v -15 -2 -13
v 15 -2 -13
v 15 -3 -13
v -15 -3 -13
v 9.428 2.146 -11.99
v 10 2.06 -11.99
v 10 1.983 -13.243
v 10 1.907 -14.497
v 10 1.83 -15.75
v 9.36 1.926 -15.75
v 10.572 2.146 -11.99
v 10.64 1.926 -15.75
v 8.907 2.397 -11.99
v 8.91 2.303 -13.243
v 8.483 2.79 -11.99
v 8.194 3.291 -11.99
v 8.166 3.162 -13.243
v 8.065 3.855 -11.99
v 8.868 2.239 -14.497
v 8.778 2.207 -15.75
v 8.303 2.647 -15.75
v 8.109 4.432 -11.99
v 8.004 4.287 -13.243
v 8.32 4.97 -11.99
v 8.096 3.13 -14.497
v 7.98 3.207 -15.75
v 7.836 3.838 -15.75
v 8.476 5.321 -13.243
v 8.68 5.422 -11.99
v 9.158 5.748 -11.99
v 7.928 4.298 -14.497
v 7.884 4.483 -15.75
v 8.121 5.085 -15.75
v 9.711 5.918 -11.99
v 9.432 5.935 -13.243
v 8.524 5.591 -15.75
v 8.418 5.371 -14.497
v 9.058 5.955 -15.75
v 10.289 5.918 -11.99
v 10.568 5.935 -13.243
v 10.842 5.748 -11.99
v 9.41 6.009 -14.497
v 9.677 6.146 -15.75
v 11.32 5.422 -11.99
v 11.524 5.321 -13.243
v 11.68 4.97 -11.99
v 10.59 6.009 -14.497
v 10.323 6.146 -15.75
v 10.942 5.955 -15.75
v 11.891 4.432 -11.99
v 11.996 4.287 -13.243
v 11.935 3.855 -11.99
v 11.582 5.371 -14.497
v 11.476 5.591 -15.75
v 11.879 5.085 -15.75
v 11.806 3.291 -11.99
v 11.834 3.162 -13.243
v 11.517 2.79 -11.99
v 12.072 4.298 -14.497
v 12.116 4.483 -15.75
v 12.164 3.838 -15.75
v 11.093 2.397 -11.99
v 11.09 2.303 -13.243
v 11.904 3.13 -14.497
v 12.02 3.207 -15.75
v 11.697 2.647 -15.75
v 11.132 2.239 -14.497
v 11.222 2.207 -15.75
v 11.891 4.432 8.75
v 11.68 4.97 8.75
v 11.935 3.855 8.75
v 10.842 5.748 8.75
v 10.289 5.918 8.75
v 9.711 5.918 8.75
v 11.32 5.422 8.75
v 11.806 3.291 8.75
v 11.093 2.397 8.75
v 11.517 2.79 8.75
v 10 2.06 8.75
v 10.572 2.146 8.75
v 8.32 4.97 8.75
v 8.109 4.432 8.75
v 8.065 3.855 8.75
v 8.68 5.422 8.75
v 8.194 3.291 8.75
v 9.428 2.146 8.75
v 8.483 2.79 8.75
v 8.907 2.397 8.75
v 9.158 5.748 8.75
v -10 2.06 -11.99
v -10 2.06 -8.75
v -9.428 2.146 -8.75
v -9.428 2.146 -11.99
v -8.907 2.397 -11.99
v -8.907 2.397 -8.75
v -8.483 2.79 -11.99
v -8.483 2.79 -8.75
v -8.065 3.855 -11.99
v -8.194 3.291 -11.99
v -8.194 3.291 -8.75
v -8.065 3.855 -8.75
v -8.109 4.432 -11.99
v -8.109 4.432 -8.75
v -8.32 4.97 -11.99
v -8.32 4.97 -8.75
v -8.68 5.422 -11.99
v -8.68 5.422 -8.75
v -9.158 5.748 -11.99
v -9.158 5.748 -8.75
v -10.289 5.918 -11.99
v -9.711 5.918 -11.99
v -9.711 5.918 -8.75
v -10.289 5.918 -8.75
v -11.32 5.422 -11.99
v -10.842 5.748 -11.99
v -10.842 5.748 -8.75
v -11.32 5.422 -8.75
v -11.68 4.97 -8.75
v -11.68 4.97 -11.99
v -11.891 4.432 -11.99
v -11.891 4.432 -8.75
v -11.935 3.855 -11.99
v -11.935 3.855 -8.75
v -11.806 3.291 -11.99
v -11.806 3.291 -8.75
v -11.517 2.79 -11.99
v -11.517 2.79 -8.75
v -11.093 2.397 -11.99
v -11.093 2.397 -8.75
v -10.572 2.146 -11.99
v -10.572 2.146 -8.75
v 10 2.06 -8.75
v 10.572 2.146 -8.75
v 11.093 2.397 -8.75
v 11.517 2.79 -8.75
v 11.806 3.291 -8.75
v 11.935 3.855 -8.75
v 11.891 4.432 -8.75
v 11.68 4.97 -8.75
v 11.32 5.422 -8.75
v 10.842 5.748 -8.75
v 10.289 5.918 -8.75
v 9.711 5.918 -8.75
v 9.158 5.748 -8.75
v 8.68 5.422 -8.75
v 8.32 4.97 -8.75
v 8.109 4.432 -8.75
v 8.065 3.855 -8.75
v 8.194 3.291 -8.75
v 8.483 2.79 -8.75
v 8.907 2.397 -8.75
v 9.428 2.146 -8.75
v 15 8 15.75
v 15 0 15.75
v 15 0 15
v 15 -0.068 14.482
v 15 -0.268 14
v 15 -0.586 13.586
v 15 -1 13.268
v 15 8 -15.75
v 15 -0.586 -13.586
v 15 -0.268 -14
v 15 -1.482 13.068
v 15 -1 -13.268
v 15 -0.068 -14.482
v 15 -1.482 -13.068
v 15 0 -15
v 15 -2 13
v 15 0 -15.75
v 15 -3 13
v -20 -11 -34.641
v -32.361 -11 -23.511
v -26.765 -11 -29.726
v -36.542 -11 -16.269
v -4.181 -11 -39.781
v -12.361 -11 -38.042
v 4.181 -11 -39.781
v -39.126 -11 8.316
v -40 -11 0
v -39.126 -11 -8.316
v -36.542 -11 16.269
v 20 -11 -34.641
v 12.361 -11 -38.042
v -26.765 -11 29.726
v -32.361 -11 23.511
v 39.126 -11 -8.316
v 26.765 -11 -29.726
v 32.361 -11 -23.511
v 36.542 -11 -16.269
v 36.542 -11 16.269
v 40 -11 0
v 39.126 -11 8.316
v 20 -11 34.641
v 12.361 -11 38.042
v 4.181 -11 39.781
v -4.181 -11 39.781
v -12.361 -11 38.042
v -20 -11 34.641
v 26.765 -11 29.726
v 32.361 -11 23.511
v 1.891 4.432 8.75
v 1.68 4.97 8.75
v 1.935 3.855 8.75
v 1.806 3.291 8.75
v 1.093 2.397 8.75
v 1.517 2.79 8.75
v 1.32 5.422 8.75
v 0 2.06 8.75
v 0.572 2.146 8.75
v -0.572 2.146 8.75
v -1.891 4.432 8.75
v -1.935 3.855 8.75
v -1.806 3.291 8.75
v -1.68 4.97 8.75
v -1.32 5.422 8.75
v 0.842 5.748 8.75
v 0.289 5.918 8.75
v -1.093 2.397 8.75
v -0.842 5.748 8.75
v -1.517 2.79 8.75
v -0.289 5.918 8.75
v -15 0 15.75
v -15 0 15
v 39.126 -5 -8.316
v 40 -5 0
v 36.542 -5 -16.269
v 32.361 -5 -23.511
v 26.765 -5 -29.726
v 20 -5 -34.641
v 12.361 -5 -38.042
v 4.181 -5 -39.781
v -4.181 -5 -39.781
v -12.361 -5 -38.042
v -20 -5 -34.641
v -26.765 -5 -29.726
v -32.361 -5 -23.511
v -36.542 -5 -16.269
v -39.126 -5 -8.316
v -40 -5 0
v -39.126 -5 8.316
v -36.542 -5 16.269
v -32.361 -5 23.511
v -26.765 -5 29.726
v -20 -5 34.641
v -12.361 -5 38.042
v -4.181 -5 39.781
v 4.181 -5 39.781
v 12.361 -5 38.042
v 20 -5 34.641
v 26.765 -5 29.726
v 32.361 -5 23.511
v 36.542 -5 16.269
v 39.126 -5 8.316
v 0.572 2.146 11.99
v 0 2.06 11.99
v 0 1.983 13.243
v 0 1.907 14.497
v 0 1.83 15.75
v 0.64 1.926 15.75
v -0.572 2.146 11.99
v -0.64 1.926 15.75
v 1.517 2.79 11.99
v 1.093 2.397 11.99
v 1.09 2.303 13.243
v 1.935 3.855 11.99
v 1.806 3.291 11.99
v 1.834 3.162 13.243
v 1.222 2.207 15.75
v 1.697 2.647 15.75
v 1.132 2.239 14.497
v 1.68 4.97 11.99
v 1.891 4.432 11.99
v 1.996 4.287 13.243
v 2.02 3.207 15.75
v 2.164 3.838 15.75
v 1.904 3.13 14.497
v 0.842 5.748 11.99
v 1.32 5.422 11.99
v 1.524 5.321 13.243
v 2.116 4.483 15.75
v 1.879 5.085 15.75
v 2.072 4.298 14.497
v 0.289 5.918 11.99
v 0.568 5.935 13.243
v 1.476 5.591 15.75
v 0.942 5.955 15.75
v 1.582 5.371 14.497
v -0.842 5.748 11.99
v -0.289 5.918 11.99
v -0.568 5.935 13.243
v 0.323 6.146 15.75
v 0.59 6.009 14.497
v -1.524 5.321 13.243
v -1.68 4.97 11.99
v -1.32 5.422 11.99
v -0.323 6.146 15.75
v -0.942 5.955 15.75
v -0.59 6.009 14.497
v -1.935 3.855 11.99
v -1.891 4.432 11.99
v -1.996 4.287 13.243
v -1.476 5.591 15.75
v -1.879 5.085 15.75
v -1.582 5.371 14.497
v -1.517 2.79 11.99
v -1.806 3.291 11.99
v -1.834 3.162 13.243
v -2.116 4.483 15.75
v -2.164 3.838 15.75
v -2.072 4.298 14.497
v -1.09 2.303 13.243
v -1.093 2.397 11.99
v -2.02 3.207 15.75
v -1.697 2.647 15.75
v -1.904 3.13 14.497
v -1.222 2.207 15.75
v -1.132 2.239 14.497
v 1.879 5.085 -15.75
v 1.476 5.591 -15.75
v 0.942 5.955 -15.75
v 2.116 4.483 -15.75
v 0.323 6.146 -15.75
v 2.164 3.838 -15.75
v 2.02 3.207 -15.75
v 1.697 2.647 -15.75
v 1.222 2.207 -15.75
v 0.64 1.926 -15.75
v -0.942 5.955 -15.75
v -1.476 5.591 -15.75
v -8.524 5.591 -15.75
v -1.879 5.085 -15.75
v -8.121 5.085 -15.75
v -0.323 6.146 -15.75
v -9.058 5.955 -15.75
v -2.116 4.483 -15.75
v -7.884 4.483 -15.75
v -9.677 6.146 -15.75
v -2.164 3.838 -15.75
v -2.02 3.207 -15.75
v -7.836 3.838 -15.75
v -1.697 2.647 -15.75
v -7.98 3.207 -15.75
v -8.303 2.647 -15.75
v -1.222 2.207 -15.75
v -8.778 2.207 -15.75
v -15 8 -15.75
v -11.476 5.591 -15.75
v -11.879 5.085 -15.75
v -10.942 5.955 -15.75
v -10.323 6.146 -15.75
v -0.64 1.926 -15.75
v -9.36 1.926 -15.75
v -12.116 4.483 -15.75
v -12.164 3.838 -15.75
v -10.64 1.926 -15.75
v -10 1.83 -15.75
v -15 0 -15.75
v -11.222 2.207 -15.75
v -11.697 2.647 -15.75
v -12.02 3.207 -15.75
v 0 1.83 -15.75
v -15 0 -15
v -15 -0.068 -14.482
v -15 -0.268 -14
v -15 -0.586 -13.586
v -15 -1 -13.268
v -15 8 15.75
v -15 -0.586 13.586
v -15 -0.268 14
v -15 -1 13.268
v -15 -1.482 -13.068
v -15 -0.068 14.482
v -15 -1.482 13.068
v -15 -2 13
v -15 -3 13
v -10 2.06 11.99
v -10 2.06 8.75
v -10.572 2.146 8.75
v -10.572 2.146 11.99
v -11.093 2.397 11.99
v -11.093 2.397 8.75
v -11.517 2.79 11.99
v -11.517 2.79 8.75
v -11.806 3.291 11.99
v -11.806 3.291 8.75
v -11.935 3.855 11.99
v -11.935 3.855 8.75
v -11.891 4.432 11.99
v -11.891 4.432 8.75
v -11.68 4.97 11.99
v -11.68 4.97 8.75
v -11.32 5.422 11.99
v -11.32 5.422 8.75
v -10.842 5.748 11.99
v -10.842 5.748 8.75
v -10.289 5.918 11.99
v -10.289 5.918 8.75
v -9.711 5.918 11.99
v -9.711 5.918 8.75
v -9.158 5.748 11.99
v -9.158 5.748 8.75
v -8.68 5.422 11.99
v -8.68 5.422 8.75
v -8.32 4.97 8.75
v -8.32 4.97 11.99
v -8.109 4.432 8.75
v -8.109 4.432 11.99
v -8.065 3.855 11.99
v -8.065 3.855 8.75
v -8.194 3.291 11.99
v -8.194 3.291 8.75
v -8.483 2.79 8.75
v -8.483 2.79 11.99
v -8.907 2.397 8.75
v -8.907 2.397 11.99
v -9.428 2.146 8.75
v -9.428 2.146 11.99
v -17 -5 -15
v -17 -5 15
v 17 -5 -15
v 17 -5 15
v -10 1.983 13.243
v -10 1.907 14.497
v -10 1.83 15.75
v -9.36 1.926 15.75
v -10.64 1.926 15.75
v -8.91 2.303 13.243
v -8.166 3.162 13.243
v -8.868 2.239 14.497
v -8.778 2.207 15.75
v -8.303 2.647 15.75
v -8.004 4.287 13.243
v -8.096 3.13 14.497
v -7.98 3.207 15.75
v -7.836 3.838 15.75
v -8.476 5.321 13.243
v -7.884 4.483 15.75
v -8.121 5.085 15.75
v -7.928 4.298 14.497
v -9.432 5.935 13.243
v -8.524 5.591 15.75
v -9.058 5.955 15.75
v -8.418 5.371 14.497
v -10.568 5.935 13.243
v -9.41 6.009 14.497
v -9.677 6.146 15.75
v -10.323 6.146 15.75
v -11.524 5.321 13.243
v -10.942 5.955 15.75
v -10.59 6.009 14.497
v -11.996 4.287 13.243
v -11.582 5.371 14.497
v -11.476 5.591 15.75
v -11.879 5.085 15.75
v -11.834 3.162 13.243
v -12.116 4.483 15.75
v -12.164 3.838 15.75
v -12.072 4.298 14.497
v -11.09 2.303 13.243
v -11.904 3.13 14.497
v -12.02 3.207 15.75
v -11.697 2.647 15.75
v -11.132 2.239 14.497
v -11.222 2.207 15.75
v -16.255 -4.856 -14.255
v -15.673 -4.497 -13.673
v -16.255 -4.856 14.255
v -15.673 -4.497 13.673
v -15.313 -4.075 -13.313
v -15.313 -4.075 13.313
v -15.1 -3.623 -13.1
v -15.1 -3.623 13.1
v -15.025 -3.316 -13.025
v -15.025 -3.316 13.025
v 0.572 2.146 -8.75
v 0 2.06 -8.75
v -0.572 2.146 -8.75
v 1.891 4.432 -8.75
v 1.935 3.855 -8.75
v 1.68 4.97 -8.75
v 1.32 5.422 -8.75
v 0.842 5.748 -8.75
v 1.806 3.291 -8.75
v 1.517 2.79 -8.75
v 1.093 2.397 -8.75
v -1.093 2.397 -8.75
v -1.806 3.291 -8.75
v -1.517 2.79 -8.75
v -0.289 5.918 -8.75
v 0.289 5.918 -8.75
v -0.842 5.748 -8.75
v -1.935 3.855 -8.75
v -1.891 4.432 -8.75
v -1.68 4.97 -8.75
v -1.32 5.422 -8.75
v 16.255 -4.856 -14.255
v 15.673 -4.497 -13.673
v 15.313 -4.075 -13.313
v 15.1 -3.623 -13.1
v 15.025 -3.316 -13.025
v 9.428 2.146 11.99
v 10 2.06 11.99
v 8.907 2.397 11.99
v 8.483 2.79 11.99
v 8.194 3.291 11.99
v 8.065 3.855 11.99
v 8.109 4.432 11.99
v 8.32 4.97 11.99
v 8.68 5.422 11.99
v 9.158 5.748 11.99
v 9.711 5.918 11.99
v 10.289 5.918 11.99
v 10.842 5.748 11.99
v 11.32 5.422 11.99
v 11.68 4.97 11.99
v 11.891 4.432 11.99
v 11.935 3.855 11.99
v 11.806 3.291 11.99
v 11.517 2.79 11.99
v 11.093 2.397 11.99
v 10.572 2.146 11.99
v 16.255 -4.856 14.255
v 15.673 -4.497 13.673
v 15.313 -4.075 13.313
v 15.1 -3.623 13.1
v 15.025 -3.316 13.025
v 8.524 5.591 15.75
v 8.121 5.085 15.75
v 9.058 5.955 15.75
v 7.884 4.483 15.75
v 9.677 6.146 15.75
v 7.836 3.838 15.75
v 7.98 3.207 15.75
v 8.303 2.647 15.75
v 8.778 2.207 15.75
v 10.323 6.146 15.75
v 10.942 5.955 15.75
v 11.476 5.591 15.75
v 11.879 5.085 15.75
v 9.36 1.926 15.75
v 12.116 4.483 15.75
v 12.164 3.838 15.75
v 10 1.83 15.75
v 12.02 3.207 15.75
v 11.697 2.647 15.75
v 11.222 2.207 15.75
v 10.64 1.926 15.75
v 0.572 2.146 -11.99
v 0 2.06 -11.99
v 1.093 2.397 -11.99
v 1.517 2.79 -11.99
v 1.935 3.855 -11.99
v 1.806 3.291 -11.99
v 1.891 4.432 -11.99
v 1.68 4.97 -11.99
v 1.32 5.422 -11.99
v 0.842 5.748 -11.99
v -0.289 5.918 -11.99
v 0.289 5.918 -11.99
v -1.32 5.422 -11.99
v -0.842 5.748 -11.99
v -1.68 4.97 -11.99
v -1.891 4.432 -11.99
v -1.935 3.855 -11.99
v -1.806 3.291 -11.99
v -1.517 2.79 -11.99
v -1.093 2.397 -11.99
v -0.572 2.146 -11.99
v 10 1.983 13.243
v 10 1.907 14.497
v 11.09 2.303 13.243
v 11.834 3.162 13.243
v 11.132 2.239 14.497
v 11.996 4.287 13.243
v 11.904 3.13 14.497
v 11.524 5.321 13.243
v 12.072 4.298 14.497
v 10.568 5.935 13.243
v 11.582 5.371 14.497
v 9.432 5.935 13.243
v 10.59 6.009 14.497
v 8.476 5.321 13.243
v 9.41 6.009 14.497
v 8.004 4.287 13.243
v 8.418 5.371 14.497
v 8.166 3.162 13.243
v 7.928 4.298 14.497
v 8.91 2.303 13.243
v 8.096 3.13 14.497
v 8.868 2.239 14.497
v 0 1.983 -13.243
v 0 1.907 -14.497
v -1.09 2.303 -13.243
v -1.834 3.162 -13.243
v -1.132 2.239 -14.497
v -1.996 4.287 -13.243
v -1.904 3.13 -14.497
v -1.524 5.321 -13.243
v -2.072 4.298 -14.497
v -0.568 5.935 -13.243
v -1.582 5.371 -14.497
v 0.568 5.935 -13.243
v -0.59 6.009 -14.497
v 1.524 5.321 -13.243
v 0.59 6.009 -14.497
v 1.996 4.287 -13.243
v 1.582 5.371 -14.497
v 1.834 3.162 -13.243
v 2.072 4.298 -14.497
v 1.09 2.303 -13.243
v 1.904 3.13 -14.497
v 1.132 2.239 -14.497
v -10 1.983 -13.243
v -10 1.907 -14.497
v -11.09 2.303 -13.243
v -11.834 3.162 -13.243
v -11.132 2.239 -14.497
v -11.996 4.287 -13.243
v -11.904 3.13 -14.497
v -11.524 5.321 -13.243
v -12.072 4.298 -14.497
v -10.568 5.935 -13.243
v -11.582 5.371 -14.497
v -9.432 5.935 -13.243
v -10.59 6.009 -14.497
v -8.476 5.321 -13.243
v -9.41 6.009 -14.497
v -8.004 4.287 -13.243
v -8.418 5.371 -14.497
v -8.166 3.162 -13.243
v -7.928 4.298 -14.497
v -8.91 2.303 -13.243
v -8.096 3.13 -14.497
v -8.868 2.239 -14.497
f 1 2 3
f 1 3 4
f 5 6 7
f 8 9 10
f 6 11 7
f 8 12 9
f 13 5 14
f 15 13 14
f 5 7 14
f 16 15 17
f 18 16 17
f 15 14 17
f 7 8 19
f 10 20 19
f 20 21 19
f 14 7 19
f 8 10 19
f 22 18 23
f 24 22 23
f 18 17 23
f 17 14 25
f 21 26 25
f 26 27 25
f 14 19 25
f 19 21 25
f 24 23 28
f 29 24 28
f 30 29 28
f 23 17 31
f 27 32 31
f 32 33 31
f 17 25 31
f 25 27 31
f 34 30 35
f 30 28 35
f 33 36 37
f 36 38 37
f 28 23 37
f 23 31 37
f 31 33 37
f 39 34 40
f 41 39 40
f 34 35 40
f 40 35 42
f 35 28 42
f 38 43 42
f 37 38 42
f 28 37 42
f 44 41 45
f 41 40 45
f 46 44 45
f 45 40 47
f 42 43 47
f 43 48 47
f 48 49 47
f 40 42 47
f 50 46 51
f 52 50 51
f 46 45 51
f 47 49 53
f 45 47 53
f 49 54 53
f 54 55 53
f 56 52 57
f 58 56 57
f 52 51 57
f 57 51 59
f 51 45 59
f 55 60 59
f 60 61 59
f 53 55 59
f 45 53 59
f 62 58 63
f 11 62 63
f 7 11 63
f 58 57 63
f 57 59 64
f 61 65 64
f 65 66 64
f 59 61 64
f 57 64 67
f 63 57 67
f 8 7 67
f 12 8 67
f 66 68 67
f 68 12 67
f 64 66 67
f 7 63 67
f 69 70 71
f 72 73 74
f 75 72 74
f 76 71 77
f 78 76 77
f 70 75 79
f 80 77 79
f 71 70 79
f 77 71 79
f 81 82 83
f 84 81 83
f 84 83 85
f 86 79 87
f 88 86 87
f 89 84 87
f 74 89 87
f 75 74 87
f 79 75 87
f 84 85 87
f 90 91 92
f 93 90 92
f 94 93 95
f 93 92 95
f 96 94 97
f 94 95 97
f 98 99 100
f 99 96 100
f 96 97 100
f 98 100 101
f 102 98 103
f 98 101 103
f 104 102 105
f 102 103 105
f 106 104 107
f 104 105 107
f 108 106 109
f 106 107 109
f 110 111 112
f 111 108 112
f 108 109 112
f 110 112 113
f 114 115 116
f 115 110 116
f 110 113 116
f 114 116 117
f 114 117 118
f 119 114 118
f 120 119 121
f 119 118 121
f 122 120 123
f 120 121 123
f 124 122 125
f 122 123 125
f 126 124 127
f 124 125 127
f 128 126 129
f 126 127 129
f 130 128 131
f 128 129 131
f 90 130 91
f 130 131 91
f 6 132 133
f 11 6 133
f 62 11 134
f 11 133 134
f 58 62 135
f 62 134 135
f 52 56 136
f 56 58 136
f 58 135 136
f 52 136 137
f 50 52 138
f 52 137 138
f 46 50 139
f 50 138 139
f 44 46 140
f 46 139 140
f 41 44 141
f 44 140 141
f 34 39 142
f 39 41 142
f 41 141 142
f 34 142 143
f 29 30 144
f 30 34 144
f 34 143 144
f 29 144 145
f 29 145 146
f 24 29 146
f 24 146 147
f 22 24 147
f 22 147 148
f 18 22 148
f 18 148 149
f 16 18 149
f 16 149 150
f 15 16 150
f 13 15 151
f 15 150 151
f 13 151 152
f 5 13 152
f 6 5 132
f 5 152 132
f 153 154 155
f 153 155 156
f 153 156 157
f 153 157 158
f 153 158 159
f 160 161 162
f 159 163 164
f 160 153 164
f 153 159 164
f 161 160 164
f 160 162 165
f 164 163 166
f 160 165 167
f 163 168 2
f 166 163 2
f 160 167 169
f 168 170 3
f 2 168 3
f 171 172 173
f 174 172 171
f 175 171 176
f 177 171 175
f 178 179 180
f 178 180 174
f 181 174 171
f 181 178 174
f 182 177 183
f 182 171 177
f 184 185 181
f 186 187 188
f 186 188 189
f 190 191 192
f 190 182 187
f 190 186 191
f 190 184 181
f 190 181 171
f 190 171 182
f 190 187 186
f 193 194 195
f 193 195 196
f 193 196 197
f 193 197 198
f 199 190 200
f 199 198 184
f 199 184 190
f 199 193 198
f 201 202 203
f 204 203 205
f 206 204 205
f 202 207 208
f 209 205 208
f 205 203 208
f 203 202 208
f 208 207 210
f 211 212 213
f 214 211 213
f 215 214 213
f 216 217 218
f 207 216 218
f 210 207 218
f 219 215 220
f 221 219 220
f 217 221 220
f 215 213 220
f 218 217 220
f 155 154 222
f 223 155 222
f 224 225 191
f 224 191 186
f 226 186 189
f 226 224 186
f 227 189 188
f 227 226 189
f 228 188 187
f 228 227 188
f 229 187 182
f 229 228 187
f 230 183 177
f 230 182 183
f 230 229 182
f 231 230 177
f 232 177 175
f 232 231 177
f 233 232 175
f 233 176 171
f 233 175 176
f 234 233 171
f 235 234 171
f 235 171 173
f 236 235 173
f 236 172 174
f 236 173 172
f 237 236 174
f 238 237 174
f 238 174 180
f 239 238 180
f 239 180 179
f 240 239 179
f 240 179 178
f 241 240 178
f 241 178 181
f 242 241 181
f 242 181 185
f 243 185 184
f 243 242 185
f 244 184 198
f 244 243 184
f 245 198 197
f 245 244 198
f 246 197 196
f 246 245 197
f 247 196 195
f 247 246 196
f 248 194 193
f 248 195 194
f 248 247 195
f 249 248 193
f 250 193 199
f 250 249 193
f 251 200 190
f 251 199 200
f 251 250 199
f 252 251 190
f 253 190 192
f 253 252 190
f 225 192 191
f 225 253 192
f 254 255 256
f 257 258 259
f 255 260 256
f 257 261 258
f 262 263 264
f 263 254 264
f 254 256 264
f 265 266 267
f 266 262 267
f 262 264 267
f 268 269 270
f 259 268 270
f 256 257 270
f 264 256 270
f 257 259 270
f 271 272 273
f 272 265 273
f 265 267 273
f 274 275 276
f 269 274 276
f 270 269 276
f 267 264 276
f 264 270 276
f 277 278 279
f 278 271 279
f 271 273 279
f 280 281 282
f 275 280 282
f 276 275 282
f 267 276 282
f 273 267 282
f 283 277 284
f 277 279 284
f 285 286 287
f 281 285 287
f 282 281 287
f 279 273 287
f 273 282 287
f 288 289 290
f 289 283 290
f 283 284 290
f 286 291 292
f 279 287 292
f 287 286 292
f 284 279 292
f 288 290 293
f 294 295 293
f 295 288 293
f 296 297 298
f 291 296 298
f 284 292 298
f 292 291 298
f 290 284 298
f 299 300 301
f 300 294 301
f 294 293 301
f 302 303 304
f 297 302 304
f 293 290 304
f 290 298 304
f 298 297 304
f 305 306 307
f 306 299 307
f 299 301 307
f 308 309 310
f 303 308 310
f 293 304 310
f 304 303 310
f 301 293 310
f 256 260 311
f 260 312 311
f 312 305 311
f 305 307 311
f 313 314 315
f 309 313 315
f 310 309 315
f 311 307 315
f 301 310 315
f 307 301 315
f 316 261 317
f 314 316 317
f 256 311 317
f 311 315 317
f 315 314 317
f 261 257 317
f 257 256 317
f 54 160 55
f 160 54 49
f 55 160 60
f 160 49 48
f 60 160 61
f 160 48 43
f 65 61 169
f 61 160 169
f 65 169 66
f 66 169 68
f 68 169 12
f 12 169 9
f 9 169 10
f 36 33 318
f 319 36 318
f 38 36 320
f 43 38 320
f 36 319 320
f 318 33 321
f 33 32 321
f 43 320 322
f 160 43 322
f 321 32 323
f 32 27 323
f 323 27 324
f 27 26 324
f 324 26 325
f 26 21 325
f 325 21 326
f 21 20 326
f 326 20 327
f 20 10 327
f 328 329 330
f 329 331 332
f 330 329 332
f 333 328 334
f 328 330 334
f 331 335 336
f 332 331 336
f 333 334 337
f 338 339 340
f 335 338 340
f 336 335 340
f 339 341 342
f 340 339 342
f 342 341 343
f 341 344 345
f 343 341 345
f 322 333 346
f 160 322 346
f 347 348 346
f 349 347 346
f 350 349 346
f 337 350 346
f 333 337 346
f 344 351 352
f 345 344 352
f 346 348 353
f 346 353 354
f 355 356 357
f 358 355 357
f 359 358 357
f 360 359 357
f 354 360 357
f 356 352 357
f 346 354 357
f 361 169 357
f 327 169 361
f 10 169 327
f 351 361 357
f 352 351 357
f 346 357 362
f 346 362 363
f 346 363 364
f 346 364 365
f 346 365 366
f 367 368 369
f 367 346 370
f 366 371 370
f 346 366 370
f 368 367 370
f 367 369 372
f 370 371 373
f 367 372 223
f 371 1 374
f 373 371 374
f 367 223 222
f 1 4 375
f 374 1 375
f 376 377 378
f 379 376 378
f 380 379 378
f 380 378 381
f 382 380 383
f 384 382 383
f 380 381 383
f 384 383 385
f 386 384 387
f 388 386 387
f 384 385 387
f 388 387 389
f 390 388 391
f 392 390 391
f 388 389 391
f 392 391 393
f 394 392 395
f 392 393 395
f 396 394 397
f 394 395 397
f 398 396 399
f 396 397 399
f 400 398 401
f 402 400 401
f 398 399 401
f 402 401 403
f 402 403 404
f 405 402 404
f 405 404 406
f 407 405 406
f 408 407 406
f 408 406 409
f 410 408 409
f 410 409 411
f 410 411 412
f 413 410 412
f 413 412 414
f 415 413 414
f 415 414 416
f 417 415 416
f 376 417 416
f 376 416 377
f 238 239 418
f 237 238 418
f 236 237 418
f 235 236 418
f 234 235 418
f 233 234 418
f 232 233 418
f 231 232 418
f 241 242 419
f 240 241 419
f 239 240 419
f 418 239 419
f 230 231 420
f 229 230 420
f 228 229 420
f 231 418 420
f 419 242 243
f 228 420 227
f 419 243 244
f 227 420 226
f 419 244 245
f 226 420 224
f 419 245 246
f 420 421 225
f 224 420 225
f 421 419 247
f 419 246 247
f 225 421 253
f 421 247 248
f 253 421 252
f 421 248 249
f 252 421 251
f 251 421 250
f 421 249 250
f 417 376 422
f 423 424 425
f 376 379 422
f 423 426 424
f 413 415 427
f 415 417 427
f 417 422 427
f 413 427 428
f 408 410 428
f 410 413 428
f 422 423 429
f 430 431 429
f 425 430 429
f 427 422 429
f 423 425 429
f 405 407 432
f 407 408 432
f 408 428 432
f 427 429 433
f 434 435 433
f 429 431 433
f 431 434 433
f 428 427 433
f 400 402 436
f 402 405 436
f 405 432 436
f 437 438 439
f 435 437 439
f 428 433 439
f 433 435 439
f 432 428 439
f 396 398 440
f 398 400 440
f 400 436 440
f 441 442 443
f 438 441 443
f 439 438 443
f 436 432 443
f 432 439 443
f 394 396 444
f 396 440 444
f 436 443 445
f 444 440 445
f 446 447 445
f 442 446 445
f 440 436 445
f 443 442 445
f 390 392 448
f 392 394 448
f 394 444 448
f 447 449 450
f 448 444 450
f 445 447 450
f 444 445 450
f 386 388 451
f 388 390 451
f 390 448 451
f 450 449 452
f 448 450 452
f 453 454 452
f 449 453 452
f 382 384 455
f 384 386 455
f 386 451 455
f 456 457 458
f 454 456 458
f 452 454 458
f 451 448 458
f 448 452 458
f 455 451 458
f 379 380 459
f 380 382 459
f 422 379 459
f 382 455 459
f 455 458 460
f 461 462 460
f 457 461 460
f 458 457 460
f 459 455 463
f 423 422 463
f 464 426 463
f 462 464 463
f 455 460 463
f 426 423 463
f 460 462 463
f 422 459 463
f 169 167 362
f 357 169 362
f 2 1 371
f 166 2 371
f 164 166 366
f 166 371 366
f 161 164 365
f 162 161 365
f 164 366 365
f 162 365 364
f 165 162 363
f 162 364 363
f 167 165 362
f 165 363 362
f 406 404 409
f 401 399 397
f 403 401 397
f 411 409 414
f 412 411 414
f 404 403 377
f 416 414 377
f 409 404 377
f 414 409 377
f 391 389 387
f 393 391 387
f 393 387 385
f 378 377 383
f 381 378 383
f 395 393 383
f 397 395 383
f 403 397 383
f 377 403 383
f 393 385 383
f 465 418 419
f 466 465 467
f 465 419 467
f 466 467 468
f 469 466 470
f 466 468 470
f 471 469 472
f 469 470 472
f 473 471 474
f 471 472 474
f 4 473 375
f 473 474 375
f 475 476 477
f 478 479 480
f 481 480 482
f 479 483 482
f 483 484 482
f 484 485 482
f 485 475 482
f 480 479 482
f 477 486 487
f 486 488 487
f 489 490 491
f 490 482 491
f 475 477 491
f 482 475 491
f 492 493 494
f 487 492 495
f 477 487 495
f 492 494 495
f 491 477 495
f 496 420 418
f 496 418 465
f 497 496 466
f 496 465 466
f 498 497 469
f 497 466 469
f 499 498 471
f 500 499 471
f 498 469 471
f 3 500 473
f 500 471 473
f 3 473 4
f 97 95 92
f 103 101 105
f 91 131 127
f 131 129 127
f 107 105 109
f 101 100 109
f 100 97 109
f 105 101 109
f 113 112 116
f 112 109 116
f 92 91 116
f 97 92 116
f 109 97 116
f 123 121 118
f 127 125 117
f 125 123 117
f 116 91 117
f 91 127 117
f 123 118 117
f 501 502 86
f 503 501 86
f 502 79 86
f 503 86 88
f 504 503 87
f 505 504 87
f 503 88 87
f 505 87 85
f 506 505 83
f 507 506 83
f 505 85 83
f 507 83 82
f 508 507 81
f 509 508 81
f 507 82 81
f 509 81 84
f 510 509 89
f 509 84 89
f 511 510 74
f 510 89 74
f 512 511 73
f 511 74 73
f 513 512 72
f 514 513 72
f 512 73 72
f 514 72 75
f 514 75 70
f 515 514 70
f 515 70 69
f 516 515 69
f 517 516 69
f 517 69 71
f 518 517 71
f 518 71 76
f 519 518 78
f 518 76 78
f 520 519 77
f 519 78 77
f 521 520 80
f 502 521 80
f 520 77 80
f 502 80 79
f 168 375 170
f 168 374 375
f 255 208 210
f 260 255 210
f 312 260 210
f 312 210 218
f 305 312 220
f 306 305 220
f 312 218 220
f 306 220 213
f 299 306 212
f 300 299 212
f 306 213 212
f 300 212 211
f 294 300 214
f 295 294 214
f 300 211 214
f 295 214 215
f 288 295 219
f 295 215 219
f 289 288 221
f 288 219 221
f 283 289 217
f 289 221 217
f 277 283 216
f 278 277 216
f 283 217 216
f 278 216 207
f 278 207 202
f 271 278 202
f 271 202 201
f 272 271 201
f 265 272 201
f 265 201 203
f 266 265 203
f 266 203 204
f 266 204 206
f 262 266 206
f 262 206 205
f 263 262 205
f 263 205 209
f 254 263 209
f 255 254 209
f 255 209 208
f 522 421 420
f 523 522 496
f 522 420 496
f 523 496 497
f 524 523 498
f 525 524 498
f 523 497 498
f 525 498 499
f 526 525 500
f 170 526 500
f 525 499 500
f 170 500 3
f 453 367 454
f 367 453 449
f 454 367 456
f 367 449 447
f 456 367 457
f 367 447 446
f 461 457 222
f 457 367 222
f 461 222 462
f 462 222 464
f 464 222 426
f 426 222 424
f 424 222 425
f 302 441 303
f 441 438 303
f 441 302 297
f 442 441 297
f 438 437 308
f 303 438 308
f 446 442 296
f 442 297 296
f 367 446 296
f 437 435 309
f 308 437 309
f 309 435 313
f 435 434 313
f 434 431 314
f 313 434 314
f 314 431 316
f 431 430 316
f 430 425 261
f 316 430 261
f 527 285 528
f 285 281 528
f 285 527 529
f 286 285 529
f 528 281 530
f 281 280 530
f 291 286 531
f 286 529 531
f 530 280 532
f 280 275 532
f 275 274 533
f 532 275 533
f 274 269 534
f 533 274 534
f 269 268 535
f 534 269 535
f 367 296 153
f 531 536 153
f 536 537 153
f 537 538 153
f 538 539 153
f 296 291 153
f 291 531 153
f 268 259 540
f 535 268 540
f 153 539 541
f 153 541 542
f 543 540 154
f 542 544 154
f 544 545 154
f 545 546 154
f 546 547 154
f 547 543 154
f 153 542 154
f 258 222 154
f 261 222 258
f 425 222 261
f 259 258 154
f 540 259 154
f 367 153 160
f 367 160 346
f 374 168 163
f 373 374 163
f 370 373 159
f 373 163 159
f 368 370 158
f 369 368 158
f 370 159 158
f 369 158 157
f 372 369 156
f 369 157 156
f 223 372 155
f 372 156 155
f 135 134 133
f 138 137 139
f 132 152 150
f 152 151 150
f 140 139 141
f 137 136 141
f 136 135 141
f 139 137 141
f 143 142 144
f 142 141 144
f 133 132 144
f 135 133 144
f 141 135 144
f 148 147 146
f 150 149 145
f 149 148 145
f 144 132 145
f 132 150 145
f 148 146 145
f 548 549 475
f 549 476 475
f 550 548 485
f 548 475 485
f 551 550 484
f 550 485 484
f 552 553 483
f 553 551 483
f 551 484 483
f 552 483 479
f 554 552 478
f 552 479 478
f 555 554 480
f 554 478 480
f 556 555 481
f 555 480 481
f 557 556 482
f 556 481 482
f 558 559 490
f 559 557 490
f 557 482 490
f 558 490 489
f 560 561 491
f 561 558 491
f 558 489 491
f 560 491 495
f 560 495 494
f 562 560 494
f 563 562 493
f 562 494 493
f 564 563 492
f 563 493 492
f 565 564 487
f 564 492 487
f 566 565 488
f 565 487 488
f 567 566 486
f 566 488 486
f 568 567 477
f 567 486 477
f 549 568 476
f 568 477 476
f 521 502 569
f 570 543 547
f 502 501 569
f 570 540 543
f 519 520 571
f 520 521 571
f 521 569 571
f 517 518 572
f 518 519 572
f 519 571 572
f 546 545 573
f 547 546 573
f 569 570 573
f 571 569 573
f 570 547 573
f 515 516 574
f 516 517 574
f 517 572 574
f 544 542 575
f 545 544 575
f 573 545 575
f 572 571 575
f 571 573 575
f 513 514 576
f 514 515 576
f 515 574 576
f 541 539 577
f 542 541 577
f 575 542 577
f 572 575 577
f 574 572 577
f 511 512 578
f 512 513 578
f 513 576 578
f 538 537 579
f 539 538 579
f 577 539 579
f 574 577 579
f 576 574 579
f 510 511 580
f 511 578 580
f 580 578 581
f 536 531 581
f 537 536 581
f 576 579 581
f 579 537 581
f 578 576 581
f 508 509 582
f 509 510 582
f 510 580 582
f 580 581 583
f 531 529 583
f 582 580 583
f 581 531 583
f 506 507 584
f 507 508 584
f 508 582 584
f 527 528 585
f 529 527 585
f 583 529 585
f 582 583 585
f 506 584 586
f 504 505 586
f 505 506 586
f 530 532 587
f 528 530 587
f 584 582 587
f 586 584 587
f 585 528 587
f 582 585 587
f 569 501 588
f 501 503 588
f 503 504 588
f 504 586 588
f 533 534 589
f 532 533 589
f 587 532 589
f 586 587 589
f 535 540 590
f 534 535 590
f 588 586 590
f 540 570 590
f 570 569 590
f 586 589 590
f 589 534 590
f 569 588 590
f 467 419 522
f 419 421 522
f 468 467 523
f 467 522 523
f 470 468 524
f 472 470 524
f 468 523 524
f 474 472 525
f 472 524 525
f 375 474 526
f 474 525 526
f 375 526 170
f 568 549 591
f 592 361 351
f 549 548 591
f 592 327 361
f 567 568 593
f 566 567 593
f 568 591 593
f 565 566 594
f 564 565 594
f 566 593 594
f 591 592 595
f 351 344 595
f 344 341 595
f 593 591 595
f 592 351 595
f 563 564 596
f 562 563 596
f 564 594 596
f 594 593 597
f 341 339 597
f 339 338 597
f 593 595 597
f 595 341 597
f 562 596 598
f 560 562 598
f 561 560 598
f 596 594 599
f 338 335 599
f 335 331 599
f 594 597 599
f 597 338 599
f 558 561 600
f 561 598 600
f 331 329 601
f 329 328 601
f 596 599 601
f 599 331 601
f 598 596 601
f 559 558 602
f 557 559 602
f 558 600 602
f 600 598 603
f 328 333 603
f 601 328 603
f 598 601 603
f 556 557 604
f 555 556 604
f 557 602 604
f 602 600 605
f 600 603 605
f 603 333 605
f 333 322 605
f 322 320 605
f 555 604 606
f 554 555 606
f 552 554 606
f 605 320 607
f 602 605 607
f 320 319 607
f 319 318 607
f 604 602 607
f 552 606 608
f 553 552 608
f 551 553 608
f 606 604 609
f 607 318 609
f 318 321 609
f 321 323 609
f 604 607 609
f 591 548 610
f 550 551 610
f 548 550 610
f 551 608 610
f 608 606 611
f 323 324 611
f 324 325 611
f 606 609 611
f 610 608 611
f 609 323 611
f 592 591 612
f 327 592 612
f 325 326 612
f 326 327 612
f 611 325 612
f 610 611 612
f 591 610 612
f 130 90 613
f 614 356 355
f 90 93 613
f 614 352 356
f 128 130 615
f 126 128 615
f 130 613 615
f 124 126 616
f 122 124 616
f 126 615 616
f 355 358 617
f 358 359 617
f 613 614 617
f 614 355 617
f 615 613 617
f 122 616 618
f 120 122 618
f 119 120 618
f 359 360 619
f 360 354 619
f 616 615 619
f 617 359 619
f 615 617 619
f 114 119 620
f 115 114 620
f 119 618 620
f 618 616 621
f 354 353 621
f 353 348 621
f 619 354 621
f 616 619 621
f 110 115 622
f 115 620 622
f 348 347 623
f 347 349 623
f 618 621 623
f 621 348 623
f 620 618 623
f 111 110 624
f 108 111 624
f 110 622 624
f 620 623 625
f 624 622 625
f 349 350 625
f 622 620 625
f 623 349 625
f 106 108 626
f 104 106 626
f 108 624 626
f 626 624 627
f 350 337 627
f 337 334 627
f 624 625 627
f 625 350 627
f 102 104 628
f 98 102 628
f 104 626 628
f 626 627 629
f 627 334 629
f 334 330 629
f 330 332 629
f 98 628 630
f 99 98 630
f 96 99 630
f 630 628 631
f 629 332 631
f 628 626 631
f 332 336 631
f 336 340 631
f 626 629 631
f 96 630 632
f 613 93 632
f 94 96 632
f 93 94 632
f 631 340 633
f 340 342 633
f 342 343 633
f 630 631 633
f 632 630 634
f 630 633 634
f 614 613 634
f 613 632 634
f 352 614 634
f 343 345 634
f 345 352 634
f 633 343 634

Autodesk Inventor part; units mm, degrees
ref_plane "YZ Plane" through (0, 0, 0) normal (1, 0, 0) x (0, 1, 0)
ref_plane "XZ Plane" through (0, 0, 0) normal (0, 1, 0) x (-1, 0, 0)
ref_plane "XY Plane" through (0, 0, 0) normal (0, 0, 1) x (1, 0, 0)
sketch "Sketch1" plane through (0, 0, 0) normal (0, 1, 0) x (-1, 0, 0)
  line L0 (-15, 15.75) -> (-15, -15.75)
  line L1 (-15, -15.75) -> (15, -15.75)
  line L2 (15, -15.75) -> (15, 15.75)
  line L3 (15, 15.75) -> (-15, 15.75)
  line L4 (-15, 15.75) -> (15, -15.75) construction
  line L5 (-15, -15.75) -> (15, 15.75) construction
  point P0 (0, 0)
  dimension "d0" = 31.5
  dimension "d1" = 30
extrude "Extrusion1" add sketch "Sketch1" along normal blind 8
sketch "Sketch2" plane through (-15, 0, 15.75) normal (0, 0, 1) x (1, 0, 0)
  circle A0 centre (15, 4) radius 1.5
  line L0 (0, 8) -> (30, 8) projected
  point P0 (15, 0)
  dimension "d4" = 3
  dimension "d5" = 8
  dimension "d6" = 4
hole "Hole1" at (0, 4, 15.75) direction (0, 0, -1) diameter 3.88 depth 7 countersink diameter 4.34 countersink angle 7
pattern_linear "Rectangular Pattern1" count 2 spacing 10 along (1, 0, 0) count 2 spacing 10 along (-1, 0, 0) of "Hole1"
mirror "Mirror1" about plane through (0, 0, 0) normal (0, 0, 1) of "Hole1", "Rectangular Pattern1"
sketch "Sketch3" plane through (0, 0, 0) normal (0, -1, 0) x (1, 0, 0)
  line L0 (-15, -13) -> (-15, 13)
  line L1 (-15, 13) -> (15, 13)
  line L2 (15, 13) -> (15, -13)
  line L3 (15, -13) -> (-15, -13)
  line L4 (-15, -13) -> (15, 13) construction
  line L5 (-15, 13) -> (15, -13) construction
  point P0 (0, 0)
  dimension "d20" = 26
  dimension "d21" = 30
extrude "Extrusion2" add sketch "Sketch3" along normal blind 5
sketch "Sketch4" plane through (0, -5, 0) normal (0, -1, 0) x (1, 0, 0)
  circle A0 centre (0, 0) radius 40
  dimension "d24" = 80
extrude "Extrusion3" add sketch "Sketch4" along normal blind 6
fillet "Fillet1" radius 2 6 edges at (0, 0, 13) (0, -5, 13) (15, -5, 0) (0, -5, -13) (-15, -5, 0) (0, 0, -13)
equation "\"d6\" = 0.5 * d5"
properties part number "cycloid_fixing_base"
